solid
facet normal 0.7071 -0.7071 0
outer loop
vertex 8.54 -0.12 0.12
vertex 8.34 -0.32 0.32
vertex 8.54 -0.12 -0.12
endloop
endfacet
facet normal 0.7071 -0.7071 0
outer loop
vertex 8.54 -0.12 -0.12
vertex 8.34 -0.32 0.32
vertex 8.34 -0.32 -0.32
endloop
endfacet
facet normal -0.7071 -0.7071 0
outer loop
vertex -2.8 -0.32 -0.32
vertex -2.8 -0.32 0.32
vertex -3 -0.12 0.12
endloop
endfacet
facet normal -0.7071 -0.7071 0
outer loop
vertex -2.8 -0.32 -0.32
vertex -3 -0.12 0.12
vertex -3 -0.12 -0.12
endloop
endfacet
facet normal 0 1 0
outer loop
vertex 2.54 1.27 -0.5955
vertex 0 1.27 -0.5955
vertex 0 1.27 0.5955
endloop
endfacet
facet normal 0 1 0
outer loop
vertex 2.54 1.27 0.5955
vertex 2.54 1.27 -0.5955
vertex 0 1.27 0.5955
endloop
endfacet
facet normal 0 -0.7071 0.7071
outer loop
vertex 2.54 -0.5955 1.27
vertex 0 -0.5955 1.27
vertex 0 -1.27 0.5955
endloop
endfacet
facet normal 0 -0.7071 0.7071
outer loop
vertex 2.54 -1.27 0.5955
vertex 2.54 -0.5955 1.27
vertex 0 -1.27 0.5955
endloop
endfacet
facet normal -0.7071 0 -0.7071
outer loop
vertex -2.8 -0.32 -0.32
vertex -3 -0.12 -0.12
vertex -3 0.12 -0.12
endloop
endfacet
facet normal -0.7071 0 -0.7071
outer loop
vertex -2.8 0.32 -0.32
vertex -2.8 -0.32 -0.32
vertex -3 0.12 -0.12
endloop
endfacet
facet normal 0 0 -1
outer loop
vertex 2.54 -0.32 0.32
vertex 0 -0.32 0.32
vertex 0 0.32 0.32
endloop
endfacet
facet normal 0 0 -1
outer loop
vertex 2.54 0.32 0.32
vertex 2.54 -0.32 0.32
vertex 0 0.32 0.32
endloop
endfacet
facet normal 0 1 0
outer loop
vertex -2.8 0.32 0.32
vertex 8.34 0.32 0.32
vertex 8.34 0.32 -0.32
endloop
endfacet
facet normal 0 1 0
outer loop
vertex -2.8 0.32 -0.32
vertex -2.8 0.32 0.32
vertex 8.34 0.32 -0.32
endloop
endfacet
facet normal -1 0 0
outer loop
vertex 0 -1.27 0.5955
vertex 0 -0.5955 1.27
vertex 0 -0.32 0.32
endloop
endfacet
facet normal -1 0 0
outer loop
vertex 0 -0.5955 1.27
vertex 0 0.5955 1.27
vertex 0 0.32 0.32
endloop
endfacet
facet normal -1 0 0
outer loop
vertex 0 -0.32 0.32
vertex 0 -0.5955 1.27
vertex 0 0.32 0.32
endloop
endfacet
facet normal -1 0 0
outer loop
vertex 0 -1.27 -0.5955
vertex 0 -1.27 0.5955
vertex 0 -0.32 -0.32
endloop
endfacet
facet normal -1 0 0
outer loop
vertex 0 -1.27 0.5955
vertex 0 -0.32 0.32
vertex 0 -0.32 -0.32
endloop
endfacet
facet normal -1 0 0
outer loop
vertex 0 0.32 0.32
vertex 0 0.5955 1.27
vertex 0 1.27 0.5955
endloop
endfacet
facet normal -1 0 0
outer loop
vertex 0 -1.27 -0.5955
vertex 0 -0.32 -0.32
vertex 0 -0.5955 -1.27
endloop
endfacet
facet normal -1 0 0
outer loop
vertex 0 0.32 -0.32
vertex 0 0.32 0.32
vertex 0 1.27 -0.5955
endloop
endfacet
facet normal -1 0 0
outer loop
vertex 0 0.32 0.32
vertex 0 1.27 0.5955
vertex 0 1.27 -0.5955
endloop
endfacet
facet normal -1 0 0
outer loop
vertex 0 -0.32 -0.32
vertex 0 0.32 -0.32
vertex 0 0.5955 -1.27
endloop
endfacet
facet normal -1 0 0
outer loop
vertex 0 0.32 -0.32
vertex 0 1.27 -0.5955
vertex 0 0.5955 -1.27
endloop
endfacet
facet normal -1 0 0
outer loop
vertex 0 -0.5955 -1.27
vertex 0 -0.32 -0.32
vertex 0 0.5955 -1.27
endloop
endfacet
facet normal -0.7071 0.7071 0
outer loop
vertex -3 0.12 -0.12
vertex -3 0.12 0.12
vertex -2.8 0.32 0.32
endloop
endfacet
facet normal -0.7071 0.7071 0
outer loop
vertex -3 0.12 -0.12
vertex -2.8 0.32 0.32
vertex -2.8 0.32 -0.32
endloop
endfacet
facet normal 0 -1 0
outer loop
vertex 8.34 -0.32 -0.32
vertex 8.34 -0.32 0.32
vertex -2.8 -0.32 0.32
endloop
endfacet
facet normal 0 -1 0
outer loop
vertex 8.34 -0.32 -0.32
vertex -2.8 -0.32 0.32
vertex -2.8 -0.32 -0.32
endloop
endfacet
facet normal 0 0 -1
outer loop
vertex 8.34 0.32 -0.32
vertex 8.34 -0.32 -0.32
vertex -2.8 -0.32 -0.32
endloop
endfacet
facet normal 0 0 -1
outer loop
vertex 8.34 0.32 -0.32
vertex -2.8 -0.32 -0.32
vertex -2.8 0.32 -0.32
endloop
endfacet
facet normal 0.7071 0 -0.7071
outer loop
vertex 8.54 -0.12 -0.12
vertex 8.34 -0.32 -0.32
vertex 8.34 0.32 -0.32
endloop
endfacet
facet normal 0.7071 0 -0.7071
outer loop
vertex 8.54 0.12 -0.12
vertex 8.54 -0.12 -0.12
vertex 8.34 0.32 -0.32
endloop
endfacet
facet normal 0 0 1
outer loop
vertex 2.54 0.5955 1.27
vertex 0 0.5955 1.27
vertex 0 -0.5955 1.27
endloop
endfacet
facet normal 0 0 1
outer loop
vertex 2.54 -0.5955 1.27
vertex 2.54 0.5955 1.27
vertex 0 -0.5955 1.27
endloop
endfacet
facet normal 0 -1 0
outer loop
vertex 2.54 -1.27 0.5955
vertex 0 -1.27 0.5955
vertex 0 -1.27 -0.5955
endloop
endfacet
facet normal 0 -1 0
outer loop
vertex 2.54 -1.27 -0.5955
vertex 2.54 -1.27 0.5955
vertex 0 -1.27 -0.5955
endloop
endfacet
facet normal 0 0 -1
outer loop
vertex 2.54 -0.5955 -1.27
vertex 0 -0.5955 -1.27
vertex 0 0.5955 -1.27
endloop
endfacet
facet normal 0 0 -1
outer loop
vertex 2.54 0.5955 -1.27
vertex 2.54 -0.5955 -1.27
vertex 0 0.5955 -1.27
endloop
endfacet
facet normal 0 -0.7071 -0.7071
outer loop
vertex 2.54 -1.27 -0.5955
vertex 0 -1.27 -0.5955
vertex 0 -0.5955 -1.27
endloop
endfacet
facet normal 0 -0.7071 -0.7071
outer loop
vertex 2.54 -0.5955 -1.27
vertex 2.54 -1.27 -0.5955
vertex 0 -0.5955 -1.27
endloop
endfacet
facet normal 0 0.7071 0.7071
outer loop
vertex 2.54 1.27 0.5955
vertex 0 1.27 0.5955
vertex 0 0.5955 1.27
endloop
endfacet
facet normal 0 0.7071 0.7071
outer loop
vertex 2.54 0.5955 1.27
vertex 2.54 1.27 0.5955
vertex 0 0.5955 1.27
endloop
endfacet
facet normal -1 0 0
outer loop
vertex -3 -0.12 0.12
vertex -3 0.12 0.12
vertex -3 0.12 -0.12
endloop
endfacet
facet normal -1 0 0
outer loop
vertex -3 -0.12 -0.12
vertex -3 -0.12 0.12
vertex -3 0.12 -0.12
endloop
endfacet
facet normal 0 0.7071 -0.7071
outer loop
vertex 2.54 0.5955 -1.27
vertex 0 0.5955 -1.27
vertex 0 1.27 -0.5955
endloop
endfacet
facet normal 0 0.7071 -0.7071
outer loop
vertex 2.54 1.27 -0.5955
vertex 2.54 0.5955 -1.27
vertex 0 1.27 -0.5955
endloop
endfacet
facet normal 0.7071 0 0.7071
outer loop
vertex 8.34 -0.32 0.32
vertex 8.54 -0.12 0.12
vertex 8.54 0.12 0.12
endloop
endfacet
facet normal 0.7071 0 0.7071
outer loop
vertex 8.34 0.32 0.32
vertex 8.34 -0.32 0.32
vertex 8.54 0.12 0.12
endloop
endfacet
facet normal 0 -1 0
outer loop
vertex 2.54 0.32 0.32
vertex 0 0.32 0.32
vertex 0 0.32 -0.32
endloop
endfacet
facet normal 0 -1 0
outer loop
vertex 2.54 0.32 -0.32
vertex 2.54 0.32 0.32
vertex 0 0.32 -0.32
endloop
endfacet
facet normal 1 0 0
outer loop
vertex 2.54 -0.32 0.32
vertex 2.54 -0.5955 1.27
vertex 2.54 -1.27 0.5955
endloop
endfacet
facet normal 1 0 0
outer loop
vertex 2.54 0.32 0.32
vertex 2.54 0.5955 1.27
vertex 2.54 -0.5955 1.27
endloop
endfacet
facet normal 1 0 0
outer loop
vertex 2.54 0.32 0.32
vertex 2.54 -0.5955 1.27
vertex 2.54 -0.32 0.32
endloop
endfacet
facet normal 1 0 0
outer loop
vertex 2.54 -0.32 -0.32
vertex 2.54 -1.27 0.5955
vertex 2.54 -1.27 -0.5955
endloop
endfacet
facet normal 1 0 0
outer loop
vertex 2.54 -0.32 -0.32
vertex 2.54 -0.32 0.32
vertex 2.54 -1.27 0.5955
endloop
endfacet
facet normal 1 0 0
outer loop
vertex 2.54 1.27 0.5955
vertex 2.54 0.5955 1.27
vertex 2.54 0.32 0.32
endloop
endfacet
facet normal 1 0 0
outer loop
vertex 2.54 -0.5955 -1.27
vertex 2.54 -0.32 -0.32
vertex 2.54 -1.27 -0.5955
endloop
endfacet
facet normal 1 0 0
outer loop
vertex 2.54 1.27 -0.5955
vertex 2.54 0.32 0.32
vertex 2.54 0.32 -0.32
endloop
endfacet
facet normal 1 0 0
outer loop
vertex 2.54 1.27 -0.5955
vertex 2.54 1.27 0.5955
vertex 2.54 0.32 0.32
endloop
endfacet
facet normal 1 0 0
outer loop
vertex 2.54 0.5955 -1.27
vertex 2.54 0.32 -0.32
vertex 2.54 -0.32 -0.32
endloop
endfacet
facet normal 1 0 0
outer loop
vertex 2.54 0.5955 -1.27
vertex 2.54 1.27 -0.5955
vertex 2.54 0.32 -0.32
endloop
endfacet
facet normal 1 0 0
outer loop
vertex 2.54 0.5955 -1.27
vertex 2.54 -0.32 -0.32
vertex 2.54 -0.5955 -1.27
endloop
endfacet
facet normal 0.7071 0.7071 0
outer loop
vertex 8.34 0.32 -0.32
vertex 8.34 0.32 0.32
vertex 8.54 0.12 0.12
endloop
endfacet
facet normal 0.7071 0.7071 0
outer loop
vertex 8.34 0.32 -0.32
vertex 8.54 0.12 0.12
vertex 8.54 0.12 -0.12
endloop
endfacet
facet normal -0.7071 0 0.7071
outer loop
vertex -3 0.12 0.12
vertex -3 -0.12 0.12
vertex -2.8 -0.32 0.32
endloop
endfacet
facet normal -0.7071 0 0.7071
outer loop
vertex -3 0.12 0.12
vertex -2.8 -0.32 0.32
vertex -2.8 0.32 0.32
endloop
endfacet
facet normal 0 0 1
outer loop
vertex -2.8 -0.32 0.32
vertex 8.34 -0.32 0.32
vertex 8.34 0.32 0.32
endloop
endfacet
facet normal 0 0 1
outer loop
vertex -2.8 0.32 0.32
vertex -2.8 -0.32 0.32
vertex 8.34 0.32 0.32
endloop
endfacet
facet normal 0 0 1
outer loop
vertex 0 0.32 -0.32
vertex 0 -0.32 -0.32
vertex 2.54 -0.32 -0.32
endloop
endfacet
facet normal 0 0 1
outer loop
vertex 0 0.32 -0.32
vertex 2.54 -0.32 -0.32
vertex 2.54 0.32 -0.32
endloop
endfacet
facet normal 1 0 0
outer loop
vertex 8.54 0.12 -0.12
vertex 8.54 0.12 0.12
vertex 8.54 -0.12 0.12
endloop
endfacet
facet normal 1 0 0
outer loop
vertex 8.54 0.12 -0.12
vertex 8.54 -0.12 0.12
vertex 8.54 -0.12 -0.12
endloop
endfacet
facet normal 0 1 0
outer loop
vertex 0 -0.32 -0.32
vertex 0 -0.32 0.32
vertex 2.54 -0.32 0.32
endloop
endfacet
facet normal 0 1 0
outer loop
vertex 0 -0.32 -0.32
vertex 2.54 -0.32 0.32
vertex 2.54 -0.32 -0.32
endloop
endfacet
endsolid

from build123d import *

# Parameters (mm, degrees)
CROQUIS1_W                   = 0.64
CROQUIS1_H                   = 0.64
SALIENTE_EXTRUIR1_DEPTH      = 2.54
CROQUIS3_W                   = 0.64
CROQUIS3_H                   = 0.64
SALIENTE_EXTRUIR2_DEPTH      = 8.54
SALIENTE_EXTRUIR2_DEPTH_BACK = 3
CHAFL_N1_SIZE                = 0.2


with BuildPart() as part:
    # Croquis1 → Saliente-Extruir1 (new body)
    with BuildSketch(Plane(origin=(0, 0, 0), x_dir=(0, 0, -1), z_dir=(1, 0, 0))):
        Polygon((-0.595482683, 1.27), (-1.27, 0.595482683), (-1.27, -0.595482683), (-0.595482683, -1.27), (0.595482683, -1.27), (1.27, -0.595482683), (1.27, 0.595482683), (0.595482683, 1.27), align=None)
        Rectangle(CROQUIS1_W, CROQUIS1_H, mode=Mode.SUBTRACT)
    extrude(amount=SALIENTE_EXTRUIR1_DEPTH)


with BuildPart() as body_2:
    # Croquis3 → Saliente-Extruir2 (new body, two sides)
    with BuildSketch(Plane(origin=(0, 0, 0), x_dir=(0, 0, -1), z_dir=(1, 0, 0))) as saliente_extruir2_sk:
        Rectangle(CROQUIS3_W, CROQUIS3_H)
    extrude(amount=SALIENTE_EXTRUIR2_DEPTH)
    extrude(saliente_extruir2_sk.sketch, amount=-SALIENTE_EXTRUIR2_DEPTH_BACK)

    # Chaflán1
    chafl_n1_edges = [body_2.edges().sort_by_distance(p)[0] for p in [
        (-3, 0, -0.32),
        (8.54, 0, 0.32),
        (8.54, -0.32, 0),
        (-3, 0.32, 0),
        (8.54, 0, -0.32),
        (8.54, 0.32, 0),
        (-3, 0, 0.32),
        (-3, -0.32, 0),
    ]]
    chamfer(chafl_n1_edges, length=CHAFL_N1_SIZE)


solid = Compound([part.part, body_2.part])
